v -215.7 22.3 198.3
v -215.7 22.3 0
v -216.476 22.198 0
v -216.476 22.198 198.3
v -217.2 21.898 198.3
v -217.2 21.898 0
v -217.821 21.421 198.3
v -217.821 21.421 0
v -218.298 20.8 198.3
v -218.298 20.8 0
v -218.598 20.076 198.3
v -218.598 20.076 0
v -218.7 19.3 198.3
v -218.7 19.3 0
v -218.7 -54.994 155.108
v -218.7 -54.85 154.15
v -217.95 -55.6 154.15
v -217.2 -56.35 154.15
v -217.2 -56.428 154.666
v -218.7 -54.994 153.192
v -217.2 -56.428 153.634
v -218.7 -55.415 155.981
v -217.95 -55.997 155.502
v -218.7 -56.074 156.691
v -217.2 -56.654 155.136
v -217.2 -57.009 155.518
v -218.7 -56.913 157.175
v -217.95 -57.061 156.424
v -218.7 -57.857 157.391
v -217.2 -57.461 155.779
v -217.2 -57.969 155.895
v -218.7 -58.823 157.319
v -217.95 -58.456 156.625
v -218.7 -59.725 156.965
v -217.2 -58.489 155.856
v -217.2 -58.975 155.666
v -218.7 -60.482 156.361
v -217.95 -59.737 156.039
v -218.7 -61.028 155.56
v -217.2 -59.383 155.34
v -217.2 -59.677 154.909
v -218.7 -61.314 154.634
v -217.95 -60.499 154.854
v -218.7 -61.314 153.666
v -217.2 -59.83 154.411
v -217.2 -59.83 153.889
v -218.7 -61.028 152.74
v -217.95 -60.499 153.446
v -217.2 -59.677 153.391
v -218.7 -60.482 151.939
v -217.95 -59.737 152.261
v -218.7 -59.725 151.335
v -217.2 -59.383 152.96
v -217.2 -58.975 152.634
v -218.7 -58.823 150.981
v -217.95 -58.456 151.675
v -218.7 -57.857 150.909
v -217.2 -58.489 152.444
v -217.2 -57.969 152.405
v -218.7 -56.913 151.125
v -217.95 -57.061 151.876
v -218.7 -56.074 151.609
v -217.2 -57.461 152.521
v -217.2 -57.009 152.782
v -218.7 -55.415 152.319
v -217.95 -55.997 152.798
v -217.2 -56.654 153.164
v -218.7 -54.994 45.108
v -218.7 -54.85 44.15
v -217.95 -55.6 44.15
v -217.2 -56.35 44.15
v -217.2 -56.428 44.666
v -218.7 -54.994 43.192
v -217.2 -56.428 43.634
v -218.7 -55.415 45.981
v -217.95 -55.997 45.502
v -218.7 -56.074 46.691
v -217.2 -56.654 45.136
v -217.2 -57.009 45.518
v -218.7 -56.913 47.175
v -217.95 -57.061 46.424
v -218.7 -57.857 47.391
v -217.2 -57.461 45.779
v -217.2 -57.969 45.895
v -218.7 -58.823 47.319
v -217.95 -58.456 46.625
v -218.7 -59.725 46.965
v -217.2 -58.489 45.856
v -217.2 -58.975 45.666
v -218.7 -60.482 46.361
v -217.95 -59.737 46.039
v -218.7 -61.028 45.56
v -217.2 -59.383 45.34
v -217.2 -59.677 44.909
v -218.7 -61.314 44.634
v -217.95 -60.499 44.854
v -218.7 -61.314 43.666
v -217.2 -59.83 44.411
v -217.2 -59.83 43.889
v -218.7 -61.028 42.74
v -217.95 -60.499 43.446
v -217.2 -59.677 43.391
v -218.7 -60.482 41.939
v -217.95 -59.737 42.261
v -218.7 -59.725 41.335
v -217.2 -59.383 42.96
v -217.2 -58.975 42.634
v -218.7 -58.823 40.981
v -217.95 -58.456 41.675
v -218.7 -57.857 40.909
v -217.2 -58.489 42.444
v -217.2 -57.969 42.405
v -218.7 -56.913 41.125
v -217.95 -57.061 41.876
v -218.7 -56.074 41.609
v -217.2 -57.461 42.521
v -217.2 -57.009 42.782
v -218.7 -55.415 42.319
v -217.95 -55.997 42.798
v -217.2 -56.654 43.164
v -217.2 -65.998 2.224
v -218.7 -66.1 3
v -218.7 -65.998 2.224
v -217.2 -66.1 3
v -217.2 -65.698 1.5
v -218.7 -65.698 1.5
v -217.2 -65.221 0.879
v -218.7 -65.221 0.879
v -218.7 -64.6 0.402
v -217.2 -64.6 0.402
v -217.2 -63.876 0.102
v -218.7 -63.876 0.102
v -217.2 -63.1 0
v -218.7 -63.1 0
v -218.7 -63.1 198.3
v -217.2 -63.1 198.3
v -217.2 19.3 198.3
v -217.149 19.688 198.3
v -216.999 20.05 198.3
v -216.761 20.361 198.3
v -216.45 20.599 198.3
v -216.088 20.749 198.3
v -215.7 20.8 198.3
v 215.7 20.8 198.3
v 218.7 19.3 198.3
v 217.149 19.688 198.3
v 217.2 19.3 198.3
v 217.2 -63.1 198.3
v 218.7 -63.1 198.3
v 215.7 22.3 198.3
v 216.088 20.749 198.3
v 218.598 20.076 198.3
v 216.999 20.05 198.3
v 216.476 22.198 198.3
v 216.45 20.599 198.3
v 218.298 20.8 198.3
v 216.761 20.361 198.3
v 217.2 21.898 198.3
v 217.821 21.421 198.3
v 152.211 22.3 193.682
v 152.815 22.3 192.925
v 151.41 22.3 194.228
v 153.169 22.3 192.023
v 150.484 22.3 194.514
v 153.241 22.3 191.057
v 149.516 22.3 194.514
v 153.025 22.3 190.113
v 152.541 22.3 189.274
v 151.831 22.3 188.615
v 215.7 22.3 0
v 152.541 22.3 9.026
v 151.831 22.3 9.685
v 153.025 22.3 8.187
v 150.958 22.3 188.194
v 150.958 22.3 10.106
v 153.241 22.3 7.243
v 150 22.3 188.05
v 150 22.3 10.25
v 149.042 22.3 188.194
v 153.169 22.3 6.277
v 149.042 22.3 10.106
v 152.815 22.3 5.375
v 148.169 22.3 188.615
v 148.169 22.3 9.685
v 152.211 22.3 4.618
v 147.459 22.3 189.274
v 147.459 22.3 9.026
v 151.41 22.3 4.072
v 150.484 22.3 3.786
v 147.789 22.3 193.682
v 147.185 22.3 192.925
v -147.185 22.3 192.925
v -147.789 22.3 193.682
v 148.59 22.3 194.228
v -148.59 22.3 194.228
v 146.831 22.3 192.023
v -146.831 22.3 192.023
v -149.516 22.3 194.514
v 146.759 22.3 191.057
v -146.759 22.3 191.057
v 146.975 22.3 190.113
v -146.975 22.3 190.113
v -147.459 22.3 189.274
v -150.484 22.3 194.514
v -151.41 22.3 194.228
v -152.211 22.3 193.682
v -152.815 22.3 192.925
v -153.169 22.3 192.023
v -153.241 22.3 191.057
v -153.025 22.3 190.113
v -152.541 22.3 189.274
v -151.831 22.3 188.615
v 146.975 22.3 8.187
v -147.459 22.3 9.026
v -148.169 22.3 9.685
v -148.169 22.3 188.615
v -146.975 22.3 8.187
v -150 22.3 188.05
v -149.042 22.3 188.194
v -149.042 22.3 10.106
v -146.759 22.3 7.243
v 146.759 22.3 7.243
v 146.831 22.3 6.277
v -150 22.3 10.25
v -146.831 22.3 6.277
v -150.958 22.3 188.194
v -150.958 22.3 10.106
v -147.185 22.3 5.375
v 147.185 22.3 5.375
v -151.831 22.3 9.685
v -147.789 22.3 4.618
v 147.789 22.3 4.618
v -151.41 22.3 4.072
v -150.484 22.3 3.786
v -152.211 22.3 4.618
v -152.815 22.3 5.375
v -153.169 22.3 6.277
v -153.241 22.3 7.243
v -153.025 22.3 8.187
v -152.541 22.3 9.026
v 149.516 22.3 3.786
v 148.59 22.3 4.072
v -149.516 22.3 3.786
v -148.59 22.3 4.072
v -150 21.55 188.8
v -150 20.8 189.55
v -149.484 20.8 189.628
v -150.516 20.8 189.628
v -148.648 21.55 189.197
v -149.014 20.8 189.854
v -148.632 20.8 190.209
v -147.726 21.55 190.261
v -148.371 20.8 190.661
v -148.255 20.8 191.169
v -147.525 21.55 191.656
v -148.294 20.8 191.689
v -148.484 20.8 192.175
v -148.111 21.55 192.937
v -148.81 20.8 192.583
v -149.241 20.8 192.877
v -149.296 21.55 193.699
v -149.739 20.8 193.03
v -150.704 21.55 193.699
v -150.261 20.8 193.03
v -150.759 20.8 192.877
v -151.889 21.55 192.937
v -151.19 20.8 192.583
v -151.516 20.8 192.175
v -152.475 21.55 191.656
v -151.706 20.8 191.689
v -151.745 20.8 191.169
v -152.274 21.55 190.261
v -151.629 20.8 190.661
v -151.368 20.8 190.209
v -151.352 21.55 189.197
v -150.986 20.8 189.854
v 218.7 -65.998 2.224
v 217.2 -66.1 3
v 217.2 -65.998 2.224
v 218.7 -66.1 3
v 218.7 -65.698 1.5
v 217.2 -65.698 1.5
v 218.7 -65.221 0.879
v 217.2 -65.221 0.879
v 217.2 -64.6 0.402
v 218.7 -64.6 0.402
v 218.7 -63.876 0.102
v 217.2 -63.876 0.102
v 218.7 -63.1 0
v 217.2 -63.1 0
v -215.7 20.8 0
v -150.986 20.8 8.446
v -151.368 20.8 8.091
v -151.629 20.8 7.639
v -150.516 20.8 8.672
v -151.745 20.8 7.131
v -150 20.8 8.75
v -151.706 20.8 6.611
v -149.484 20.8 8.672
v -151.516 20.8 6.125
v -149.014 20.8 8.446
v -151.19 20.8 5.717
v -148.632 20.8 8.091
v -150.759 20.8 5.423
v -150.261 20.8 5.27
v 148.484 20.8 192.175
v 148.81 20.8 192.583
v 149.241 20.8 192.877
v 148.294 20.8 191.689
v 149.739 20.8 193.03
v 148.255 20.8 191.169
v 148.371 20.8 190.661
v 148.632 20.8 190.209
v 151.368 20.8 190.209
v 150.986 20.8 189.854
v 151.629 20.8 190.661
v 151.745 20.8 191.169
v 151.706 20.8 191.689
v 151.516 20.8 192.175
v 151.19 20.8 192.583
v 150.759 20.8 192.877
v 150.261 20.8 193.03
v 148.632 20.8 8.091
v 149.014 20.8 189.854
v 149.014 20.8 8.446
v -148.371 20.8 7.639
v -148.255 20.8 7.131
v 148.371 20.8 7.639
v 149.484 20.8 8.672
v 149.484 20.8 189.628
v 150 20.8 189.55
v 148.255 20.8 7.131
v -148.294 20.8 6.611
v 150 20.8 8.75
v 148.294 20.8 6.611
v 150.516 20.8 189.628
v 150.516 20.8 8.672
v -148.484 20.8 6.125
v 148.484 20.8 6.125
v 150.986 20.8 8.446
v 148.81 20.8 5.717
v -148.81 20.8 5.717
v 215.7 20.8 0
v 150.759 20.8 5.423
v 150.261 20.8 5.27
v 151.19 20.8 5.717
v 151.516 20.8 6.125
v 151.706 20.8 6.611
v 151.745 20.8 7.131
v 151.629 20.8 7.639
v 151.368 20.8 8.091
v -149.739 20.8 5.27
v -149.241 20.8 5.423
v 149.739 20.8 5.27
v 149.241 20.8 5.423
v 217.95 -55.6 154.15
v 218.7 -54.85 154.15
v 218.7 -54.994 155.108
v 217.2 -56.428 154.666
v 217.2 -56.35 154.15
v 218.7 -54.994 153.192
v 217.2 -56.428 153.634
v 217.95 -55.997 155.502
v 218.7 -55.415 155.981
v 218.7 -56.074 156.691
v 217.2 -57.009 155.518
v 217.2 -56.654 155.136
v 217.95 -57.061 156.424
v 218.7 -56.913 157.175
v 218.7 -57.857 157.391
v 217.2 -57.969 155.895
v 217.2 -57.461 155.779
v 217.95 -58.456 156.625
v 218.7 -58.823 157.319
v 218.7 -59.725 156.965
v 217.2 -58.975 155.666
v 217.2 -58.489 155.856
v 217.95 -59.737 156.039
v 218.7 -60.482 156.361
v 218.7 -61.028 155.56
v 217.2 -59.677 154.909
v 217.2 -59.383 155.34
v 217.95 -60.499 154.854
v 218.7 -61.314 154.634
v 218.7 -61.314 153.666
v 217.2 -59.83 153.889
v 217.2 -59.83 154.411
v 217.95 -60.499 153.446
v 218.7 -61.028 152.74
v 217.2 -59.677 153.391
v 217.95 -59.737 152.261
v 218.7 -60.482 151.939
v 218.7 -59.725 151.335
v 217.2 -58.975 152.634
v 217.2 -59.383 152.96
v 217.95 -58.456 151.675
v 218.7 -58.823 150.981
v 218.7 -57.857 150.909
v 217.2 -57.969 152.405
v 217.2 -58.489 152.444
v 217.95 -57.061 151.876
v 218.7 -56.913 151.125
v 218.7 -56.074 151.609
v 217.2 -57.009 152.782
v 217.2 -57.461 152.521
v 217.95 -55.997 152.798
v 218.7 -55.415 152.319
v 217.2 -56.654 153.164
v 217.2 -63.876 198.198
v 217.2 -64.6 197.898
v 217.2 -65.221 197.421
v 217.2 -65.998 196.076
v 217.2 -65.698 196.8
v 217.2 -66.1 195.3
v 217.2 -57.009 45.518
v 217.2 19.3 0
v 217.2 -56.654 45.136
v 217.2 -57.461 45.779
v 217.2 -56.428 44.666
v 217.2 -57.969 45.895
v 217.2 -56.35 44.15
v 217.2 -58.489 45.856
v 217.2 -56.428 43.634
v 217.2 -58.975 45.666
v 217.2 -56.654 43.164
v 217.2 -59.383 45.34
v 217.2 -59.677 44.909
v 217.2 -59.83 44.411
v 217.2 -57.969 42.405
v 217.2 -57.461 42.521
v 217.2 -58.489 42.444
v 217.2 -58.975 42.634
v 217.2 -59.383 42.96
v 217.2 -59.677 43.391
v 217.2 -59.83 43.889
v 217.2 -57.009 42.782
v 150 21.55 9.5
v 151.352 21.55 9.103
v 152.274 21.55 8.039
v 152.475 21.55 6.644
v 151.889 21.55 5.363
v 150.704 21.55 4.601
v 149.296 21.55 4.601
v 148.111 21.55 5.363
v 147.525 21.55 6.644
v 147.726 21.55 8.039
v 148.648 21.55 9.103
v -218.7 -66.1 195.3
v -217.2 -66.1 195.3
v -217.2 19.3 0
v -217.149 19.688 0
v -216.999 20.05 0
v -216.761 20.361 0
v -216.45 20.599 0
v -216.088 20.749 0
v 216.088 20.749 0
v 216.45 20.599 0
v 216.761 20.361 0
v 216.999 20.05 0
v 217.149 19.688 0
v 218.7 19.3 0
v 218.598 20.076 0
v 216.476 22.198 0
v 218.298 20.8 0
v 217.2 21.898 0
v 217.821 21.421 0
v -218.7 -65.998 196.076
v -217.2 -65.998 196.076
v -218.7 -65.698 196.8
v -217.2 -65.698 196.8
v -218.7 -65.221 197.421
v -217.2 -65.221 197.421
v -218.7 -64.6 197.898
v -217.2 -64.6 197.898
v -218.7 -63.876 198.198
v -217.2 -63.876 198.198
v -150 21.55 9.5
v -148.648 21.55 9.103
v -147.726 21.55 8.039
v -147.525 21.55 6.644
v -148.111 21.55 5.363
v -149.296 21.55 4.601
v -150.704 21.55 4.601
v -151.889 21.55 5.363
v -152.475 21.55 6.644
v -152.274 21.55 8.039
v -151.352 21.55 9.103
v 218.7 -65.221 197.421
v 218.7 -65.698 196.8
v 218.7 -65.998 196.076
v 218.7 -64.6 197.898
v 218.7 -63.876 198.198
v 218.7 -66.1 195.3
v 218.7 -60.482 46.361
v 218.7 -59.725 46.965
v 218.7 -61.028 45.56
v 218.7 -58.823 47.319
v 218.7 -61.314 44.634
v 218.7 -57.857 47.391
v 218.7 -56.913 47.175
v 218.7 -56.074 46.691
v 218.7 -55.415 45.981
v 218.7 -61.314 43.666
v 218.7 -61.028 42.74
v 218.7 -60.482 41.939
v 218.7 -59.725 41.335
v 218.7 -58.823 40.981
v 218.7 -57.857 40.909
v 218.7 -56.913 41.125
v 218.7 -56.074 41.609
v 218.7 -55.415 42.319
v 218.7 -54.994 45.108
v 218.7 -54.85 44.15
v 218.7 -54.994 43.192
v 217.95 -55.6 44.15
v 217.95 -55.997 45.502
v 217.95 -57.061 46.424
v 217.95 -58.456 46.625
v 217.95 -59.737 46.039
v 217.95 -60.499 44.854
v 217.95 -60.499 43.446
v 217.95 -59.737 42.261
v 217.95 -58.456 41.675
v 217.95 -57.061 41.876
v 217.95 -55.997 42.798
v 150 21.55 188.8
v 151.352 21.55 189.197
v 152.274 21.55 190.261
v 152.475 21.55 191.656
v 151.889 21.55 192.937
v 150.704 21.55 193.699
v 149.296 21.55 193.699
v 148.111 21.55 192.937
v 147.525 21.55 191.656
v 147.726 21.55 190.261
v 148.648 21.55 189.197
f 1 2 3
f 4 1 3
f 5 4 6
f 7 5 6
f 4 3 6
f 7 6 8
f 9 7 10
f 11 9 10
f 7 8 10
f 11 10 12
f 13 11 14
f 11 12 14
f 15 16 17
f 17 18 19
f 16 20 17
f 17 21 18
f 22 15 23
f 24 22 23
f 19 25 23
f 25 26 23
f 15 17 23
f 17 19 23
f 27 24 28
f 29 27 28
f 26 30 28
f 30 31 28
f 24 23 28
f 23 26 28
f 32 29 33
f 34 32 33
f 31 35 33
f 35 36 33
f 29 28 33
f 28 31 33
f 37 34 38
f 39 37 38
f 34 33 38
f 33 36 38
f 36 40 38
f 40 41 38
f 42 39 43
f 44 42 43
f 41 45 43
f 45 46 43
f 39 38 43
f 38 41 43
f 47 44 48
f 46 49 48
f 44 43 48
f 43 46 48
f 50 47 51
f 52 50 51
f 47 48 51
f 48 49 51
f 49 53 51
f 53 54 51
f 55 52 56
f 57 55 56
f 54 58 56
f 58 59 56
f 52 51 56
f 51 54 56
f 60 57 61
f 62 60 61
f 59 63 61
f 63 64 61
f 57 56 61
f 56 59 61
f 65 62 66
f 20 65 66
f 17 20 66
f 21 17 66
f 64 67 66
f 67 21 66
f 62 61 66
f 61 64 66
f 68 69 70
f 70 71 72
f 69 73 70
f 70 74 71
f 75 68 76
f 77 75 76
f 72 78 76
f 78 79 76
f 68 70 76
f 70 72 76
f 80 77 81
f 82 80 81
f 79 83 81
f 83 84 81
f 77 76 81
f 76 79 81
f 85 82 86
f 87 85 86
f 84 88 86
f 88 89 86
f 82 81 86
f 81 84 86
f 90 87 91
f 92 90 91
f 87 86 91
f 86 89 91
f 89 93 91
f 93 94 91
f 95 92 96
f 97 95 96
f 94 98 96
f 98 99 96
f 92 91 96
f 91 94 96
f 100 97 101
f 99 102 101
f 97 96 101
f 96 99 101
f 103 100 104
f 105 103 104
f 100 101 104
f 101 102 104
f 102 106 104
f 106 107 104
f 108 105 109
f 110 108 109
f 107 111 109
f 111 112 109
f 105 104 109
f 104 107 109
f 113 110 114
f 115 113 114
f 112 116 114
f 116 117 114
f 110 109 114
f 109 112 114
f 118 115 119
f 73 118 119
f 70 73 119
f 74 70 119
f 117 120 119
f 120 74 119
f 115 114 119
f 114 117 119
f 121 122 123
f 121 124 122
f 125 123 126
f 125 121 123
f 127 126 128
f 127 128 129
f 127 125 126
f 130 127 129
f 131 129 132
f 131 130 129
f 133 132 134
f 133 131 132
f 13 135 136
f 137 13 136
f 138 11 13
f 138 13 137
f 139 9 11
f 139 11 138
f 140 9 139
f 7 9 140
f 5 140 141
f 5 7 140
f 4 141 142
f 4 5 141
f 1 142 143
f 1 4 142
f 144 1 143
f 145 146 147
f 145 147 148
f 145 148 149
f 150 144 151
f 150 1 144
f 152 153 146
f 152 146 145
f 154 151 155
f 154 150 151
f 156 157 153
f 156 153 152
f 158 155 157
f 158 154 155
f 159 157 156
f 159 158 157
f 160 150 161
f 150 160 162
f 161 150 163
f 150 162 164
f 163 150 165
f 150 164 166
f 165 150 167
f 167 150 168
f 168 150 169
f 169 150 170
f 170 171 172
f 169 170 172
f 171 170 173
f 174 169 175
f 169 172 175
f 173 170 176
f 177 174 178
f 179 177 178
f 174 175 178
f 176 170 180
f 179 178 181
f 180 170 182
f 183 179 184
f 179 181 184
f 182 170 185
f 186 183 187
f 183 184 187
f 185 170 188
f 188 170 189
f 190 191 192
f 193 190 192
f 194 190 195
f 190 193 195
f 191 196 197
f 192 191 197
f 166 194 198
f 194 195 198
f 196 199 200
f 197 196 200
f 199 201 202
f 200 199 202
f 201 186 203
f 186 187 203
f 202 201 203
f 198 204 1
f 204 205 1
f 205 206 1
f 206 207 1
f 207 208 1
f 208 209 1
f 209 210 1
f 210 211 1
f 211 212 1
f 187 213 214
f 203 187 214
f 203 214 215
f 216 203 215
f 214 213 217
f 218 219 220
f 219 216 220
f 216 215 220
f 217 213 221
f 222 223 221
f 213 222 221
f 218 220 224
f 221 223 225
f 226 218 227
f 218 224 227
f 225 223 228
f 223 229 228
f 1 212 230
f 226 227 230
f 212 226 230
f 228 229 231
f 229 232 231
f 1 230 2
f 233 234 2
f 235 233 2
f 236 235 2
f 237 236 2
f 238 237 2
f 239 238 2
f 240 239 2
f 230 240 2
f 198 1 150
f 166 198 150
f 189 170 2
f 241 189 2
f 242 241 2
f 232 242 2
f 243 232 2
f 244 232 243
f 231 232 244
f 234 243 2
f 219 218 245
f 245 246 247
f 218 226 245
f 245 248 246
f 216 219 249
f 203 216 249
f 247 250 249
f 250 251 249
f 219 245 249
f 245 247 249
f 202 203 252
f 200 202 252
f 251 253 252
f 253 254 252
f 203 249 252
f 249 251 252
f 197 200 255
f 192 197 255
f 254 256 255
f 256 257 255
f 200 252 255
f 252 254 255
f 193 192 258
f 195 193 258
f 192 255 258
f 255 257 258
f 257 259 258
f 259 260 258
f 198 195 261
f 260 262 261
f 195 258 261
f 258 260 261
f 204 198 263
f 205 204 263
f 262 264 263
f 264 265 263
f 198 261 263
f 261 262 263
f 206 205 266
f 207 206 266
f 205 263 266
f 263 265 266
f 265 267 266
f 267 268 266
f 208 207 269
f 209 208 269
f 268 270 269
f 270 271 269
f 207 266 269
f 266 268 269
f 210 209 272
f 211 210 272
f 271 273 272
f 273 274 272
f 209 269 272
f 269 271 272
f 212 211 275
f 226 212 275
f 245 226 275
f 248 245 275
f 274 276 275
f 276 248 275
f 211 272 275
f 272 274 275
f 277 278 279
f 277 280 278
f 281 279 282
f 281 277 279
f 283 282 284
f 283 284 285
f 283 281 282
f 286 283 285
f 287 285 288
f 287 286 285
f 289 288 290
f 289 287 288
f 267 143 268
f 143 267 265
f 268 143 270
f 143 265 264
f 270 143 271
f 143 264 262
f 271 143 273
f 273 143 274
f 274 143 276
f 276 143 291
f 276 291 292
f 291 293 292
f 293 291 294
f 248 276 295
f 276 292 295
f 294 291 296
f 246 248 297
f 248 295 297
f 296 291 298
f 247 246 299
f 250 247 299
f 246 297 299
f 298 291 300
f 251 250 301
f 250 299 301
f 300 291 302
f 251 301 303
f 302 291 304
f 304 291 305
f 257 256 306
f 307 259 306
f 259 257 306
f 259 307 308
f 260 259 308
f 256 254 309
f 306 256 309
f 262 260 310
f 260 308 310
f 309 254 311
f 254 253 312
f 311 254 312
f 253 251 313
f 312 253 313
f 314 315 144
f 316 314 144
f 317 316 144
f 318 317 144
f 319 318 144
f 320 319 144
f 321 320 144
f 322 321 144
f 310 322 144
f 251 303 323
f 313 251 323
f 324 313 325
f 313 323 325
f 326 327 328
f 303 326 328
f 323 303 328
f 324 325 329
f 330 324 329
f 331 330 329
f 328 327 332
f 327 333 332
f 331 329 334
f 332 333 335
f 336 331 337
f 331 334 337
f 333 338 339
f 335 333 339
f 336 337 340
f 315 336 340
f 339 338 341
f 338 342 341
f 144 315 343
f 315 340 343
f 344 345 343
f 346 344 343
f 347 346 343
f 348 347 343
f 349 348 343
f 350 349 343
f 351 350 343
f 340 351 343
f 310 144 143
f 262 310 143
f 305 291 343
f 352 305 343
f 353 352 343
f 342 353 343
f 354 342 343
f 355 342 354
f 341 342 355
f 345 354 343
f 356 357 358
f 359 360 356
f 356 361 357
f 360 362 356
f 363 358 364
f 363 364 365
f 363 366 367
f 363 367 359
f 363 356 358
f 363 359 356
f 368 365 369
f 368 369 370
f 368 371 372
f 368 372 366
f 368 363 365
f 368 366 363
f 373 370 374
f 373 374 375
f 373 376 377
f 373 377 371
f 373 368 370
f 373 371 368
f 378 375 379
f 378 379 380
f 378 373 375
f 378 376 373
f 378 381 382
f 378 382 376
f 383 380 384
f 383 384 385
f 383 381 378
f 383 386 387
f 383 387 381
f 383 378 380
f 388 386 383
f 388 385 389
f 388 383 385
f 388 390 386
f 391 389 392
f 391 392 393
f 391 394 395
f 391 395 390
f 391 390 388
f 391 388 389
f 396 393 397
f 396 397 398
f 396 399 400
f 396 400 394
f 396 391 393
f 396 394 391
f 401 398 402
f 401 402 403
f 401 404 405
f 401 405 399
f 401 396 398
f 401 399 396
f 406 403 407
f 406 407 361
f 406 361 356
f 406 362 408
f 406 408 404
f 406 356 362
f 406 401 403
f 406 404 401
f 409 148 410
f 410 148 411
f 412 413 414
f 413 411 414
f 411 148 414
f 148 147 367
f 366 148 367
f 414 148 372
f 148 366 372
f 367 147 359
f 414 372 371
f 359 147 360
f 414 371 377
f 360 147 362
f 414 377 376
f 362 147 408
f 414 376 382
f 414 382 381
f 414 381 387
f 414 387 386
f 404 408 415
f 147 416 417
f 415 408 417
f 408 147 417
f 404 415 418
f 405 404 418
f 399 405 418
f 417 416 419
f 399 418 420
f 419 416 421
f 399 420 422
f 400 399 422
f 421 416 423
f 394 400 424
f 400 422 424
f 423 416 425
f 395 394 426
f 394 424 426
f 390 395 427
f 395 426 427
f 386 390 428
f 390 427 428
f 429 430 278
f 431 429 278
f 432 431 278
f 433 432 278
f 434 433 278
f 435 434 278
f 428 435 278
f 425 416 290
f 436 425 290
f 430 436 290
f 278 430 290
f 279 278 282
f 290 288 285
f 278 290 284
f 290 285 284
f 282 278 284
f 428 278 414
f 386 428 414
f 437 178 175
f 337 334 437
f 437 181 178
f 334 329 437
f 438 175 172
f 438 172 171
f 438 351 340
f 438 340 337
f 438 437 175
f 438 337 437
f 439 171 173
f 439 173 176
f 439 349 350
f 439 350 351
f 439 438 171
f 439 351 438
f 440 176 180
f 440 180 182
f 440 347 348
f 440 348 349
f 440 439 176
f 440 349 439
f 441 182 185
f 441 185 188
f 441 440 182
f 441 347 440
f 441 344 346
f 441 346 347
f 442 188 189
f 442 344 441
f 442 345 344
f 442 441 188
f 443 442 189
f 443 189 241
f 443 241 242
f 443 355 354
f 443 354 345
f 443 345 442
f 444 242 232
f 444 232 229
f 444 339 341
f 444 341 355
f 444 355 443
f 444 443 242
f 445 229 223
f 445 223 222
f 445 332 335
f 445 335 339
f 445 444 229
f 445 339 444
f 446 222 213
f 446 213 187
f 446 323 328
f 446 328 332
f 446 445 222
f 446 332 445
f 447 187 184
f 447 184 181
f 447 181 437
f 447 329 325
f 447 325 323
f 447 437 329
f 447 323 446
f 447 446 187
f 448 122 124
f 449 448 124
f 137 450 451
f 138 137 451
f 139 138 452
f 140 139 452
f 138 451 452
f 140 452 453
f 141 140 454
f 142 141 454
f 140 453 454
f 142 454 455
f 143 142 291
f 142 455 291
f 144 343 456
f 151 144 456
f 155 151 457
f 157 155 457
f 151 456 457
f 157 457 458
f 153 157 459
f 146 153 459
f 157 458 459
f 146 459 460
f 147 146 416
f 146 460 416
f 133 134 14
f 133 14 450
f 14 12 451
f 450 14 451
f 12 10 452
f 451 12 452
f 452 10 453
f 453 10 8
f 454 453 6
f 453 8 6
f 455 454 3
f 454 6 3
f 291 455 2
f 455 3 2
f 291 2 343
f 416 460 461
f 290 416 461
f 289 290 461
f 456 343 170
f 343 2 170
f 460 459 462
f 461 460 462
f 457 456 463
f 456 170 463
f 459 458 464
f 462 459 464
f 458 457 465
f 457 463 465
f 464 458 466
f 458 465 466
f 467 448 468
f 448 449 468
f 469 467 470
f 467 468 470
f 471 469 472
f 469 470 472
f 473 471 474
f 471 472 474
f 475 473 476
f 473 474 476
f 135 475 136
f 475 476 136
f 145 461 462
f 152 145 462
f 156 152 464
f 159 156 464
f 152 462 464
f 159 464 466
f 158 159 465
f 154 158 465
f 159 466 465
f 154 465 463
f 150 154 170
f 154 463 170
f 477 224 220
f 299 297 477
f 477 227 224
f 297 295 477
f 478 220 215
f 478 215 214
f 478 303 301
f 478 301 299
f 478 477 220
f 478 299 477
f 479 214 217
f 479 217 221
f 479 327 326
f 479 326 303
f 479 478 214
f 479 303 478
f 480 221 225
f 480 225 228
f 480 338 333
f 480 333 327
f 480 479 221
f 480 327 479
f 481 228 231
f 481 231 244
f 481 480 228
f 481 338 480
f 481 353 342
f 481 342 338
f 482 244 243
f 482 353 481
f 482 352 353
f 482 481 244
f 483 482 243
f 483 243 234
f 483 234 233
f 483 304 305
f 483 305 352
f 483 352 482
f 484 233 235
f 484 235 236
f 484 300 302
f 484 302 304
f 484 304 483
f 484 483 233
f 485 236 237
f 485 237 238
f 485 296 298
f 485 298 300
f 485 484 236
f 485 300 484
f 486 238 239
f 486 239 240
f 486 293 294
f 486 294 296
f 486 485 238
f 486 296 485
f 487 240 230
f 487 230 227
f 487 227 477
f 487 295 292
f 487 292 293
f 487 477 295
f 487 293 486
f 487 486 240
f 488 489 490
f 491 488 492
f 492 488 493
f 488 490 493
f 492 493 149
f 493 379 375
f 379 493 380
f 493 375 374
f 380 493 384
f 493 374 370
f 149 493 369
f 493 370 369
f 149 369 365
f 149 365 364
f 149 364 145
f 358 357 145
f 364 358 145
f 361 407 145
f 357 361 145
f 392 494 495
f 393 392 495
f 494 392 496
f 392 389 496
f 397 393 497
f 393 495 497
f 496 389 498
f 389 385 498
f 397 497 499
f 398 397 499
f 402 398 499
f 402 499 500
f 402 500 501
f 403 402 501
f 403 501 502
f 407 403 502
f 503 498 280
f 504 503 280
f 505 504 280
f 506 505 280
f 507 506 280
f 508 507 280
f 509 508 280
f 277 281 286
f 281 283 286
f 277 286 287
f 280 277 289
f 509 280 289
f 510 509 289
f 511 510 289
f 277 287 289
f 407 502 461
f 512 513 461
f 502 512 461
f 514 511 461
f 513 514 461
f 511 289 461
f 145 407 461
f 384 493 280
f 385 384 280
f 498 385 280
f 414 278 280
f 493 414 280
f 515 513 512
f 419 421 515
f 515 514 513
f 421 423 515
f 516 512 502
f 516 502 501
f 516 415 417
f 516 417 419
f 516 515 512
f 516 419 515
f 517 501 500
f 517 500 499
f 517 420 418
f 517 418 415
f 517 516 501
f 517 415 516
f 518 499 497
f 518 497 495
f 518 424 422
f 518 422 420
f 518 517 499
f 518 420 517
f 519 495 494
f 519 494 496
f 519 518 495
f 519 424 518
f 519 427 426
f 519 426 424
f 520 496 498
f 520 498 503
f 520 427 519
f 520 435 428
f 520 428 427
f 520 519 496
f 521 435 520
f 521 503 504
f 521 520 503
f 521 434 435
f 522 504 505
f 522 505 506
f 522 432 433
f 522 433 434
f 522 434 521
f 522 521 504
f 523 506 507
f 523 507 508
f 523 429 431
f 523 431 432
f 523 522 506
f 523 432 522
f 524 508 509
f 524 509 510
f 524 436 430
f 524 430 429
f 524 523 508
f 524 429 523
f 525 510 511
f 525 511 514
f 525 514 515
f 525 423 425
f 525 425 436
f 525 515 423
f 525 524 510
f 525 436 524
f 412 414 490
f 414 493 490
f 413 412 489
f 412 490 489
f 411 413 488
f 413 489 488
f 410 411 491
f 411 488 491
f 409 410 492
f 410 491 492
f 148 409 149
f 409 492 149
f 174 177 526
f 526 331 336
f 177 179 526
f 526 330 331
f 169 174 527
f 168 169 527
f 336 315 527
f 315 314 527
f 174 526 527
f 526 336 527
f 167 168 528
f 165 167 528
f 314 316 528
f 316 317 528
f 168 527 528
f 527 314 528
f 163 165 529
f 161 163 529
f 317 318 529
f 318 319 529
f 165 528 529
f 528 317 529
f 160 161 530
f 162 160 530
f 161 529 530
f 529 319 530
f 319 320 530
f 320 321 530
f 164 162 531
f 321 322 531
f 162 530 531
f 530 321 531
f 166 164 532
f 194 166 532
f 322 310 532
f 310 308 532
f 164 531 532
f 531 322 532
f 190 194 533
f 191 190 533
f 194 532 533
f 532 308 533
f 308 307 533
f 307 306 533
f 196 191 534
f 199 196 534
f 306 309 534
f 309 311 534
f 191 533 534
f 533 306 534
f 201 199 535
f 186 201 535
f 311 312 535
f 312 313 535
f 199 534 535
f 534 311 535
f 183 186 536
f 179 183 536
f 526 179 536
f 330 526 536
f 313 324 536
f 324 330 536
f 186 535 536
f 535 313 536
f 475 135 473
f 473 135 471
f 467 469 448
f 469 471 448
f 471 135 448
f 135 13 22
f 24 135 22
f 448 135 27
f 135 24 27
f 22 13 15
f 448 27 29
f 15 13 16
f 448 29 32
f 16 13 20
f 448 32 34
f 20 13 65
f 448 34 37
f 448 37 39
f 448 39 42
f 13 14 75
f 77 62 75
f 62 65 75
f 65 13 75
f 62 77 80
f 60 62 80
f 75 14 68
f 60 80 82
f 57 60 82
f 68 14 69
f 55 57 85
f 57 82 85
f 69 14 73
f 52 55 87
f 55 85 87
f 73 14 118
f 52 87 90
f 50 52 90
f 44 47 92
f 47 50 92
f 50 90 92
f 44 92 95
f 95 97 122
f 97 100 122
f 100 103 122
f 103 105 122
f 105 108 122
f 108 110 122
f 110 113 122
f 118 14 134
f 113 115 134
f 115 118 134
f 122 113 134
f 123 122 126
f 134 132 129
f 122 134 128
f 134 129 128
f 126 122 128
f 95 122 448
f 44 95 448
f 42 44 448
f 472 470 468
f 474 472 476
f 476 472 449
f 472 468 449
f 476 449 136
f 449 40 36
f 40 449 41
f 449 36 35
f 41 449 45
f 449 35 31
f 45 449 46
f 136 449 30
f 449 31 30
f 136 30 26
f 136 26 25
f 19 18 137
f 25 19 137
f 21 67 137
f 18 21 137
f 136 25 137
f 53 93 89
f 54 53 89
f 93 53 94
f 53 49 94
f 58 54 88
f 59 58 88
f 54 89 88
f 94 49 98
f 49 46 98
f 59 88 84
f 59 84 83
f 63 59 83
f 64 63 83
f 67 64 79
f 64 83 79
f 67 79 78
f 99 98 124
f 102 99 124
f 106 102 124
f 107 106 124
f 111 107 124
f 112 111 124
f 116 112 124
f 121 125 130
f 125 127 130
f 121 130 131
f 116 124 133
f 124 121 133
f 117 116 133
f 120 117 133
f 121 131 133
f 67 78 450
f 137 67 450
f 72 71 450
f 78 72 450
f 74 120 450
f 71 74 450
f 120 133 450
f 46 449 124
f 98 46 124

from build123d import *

# Parameters (mm, degrees)
SM_BASE_FLANGE_1_DEPTH = 198.3
FILLET_1_R             = 3
SKETCH_6_R             = 1.65
CUT_EXTRUDE_1_DEPTH    = 309.167389579
CUT_EXTRUDE_2_REACH    = 486.779
SKETCH_7_R             = 1.65
CHAMFER_2_SIZE         = 1.6


# Sheet-metal steps are written as plain solids
with BuildPart() as part:
    # Sketch 1 → Базовая кромка1 (new body)
    with BuildSketch(Plane.XY):
        with BuildLine():
            Line((-217.2, -66.1), (-217.2, 19.3))
            ThreePointArc((-217.2, 19.3), (-216.760660172, 20.360660172), (-215.7, 20.8))
            Line((-215.7, 20.8), (215.7, 20.8))
            ThreePointArc((215.7, 20.8), (216.760660172, 20.360660172), (217.2, 19.3))
            Line((217.2, 19.3), (217.2, -66.1))
            Line((217.2, -66.1), (218.7, -66.1))
            Line((218.7, -66.1), (218.7, 19.3))
            ThreePointArc((218.7, 19.3), (217.821320344, 21.421320344), (215.7, 22.3))
            Line((215.7, 22.3), (-215.7, 22.3))
            ThreePointArc((-215.7, 22.3), (-217.821320344, 21.421320344), (-218.7, 19.3))
            Line((-218.7, 19.3), (-218.7, -66.1))
            Line((-218.7, -66.1), (-217.2, -66.1))
        make_face()
    extrude(amount=SM_BASE_FLANGE_1_DEPTH)

    # Скругление1
    fillet_1_edges = [part.edges().sort_by_distance(p)[0] for p in [
        (-217.95, -66.1, 0),
        (217.95, -66.1, 0),
        (-217.95, -66.1, 198.3),
        (217.95, -66.1, 198.3),
    ]]
    fillet(fillet_1_edges, radius=FILLET_1_R)

    # Эскиз6 → Вырез-Вытянуть1 (cut, through all)
    with BuildSketch(Plane(origin=(0, 22.3, 0), x_dir=(1, 0, 0), z_dir=(0, 1, 0))):
        with Locations(Location((-150, -7, 0), (0, 0, 270))):
            Circle(SKETCH_6_R)
        with Locations(Location((150, -7, 0), (0, 0, 270))):
            Circle(SKETCH_6_R)
    cut_extrude_1 = extrude(amount=-CUT_EXTRUDE_1_DEPTH, mode=Mode.SUBTRACT)

    # Зеркальное отражение1: Вырез-Вытянуть1 across plane
    add(cut_extrude_1.mirror(Plane(origin=(0, 0, 99.15), x_dir=(1, 0, 0), z_dir=(0, 0, -1))), mode=Mode.SUBTRACT)

    # Вырез-Вытянуть2: up to this face of the body (flat: up to its plane)
    cut_extrude_2_end = Plane(part.part.faces().sort_by_distance((-218.7, -23.390410792, 99.15))[0])
    # Эскиз7 → Вырез-Вытянуть2 (cut, up to the picked face)
    with BuildSketch(Plane(origin=(218.7, 0, 0), x_dir=(0, 0, -1), z_dir=(1, 0, 0)), mode=Mode.PRIVATE) as cut_extrude_2_sk1:
        with Locations(Location((-154.15, -58.1, 0), (0, 0, 90))):
            Circle(SKETCH_7_R)
    cut_extrude_2_tool1 = split(extrude(cut_extrude_2_sk1.sketch, amount=-CUT_EXTRUDE_2_REACH, mode=Mode.PRIVATE), bisect_by=cut_extrude_2_end, keep=Keep.BOTH, mode=Mode.PRIVATE)
    # Эскиз7 → Вырез-Вытянуть2 (cut, up to the picked face)
    with BuildSketch(Plane(origin=(218.7, 0, 0), x_dir=(0, 0, -1), z_dir=(1, 0, 0)), mode=Mode.PRIVATE) as cut_extrude_2_sk2:
        with Locations(Location((-44.15, -58.1, 0), (0, 0, 90))):
            Circle(SKETCH_7_R)
    cut_extrude_2_tool2 = split(extrude(cut_extrude_2_sk2.sketch, amount=-CUT_EXTRUDE_2_REACH, mode=Mode.PRIVATE), bisect_by=cut_extrude_2_end, keep=Keep.BOTH, mode=Mode.PRIVATE)
    add(cut_extrude_2_tool1.solids().sort_by(Axis((218.7, -58.1, 154.15), (-1, 0, 0)))[0], mode=Mode.SUBTRACT)
    add(cut_extrude_2_tool2.solids().sort_by(Axis((218.7, -58.1, 44.15), (-1, 0, 0)))[0], mode=Mode.SUBTRACT)

    # Фаска2
    # the kernel refuses this chamfer: 1.6 mm, written as the material it takes off along each edge
    with BuildSketch(Plane(origin=(-218.7, -58.1, 44.15), x_dir=(0, 1, 0), z_dir=(0, 0, -1))) as chamfer_2_piece_1:
        Polygon((1.65 + CHAMFER_2_SIZE, 0), (1.65, CHAMFER_2_SIZE), (1.65, 0), align=None)
    revolve(axis=Axis((-218.7, -58.1, 44.15), (1, 0, 0)), mode=Mode.SUBTRACT)
    with BuildSketch(Plane(origin=(-218.7, -58.1, 154.15), x_dir=(0, 1, 0), z_dir=(0, 0, -1))) as chamfer_2_piece_2:
        Polygon((1.65 + CHAMFER_2_SIZE, 0), (1.65, CHAMFER_2_SIZE), (1.65, 0), align=None)
    revolve(axis=Axis((-218.7, -58.1, 154.15), (1, 0, 0)), mode=Mode.SUBTRACT)
    with BuildSketch(Plane(origin=(-150, 22.3, 191.3), x_dir=(0, 0, -1), z_dir=(-1, 0, 0))) as chamfer_2_piece_3:
        Polygon((1.65 + CHAMFER_2_SIZE, 0), (1.65, CHAMFER_2_SIZE), (1.65, 0), align=None)
    revolve(axis=Axis((-150, 22.3, 191.3), (0, -1, 0)), mode=Mode.SUBTRACT)
    with BuildSketch(Plane(origin=(-150, 22.3, 7), x_dir=(0, 0, 1), z_dir=(-1, 0, 0))) as chamfer_2_piece_4:
        Polygon((1.65 + CHAMFER_2_SIZE, 0), (1.65, -CHAMFER_2_SIZE), (1.65, 0), align=None)
    revolve(axis=Axis((-150, 22.3, 7), (0, 1, 0)), mode=Mode.SUBTRACT)
    with BuildSketch(Plane(origin=(150, 22.3, 7), x_dir=(0, 0, 1), z_dir=(-1, 0, 0))) as chamfer_2_piece_5:
        Polygon((1.65 + CHAMFER_2_SIZE, 0), (1.65, -CHAMFER_2_SIZE), (1.65, 0), align=None)
    revolve(axis=Axis((150, 22.3, 7), (0, 1, 0)), mode=Mode.SUBTRACT)
    with BuildSketch(Plane(origin=(218.7, -58.1, 44.15), x_dir=(0, 1, 0), z_dir=(0, 0, -1))) as chamfer_2_piece_6:
        Polygon((1.65 + CHAMFER_2_SIZE, 0), (1.65, -CHAMFER_2_SIZE), (1.65, 0), align=None)
    revolve(axis=Axis((218.7, -58.1, 44.15), (1, 0, 0)), mode=Mode.SUBTRACT)
    with BuildSketch(Plane(origin=(218.7, -58.1, 154.15), x_dir=(0, 1, 0), z_dir=(0, 0, -1))) as chamfer_2_piece_7:
        Polygon((1.65 + CHAMFER_2_SIZE, 0), (1.65, -CHAMFER_2_SIZE), (1.65, 0), align=None)
    revolve(axis=Axis((218.7, -58.1, 154.15), (1, 0, 0)), mode=Mode.SUBTRACT)
    with BuildSketch(Plane(origin=(150, 22.3, 191.3), x_dir=(0, 0, -1), z_dir=(-1, 0, 0))) as chamfer_2_piece_8:
        Polygon((1.65 + CHAMFER_2_SIZE, 0), (1.65, CHAMFER_2_SIZE), (1.65, 0), align=None)
    revolve(axis=Axis((150, 22.3, 191.3), (0, -1, 0)), mode=Mode.SUBTRACT)


solid = part.part
